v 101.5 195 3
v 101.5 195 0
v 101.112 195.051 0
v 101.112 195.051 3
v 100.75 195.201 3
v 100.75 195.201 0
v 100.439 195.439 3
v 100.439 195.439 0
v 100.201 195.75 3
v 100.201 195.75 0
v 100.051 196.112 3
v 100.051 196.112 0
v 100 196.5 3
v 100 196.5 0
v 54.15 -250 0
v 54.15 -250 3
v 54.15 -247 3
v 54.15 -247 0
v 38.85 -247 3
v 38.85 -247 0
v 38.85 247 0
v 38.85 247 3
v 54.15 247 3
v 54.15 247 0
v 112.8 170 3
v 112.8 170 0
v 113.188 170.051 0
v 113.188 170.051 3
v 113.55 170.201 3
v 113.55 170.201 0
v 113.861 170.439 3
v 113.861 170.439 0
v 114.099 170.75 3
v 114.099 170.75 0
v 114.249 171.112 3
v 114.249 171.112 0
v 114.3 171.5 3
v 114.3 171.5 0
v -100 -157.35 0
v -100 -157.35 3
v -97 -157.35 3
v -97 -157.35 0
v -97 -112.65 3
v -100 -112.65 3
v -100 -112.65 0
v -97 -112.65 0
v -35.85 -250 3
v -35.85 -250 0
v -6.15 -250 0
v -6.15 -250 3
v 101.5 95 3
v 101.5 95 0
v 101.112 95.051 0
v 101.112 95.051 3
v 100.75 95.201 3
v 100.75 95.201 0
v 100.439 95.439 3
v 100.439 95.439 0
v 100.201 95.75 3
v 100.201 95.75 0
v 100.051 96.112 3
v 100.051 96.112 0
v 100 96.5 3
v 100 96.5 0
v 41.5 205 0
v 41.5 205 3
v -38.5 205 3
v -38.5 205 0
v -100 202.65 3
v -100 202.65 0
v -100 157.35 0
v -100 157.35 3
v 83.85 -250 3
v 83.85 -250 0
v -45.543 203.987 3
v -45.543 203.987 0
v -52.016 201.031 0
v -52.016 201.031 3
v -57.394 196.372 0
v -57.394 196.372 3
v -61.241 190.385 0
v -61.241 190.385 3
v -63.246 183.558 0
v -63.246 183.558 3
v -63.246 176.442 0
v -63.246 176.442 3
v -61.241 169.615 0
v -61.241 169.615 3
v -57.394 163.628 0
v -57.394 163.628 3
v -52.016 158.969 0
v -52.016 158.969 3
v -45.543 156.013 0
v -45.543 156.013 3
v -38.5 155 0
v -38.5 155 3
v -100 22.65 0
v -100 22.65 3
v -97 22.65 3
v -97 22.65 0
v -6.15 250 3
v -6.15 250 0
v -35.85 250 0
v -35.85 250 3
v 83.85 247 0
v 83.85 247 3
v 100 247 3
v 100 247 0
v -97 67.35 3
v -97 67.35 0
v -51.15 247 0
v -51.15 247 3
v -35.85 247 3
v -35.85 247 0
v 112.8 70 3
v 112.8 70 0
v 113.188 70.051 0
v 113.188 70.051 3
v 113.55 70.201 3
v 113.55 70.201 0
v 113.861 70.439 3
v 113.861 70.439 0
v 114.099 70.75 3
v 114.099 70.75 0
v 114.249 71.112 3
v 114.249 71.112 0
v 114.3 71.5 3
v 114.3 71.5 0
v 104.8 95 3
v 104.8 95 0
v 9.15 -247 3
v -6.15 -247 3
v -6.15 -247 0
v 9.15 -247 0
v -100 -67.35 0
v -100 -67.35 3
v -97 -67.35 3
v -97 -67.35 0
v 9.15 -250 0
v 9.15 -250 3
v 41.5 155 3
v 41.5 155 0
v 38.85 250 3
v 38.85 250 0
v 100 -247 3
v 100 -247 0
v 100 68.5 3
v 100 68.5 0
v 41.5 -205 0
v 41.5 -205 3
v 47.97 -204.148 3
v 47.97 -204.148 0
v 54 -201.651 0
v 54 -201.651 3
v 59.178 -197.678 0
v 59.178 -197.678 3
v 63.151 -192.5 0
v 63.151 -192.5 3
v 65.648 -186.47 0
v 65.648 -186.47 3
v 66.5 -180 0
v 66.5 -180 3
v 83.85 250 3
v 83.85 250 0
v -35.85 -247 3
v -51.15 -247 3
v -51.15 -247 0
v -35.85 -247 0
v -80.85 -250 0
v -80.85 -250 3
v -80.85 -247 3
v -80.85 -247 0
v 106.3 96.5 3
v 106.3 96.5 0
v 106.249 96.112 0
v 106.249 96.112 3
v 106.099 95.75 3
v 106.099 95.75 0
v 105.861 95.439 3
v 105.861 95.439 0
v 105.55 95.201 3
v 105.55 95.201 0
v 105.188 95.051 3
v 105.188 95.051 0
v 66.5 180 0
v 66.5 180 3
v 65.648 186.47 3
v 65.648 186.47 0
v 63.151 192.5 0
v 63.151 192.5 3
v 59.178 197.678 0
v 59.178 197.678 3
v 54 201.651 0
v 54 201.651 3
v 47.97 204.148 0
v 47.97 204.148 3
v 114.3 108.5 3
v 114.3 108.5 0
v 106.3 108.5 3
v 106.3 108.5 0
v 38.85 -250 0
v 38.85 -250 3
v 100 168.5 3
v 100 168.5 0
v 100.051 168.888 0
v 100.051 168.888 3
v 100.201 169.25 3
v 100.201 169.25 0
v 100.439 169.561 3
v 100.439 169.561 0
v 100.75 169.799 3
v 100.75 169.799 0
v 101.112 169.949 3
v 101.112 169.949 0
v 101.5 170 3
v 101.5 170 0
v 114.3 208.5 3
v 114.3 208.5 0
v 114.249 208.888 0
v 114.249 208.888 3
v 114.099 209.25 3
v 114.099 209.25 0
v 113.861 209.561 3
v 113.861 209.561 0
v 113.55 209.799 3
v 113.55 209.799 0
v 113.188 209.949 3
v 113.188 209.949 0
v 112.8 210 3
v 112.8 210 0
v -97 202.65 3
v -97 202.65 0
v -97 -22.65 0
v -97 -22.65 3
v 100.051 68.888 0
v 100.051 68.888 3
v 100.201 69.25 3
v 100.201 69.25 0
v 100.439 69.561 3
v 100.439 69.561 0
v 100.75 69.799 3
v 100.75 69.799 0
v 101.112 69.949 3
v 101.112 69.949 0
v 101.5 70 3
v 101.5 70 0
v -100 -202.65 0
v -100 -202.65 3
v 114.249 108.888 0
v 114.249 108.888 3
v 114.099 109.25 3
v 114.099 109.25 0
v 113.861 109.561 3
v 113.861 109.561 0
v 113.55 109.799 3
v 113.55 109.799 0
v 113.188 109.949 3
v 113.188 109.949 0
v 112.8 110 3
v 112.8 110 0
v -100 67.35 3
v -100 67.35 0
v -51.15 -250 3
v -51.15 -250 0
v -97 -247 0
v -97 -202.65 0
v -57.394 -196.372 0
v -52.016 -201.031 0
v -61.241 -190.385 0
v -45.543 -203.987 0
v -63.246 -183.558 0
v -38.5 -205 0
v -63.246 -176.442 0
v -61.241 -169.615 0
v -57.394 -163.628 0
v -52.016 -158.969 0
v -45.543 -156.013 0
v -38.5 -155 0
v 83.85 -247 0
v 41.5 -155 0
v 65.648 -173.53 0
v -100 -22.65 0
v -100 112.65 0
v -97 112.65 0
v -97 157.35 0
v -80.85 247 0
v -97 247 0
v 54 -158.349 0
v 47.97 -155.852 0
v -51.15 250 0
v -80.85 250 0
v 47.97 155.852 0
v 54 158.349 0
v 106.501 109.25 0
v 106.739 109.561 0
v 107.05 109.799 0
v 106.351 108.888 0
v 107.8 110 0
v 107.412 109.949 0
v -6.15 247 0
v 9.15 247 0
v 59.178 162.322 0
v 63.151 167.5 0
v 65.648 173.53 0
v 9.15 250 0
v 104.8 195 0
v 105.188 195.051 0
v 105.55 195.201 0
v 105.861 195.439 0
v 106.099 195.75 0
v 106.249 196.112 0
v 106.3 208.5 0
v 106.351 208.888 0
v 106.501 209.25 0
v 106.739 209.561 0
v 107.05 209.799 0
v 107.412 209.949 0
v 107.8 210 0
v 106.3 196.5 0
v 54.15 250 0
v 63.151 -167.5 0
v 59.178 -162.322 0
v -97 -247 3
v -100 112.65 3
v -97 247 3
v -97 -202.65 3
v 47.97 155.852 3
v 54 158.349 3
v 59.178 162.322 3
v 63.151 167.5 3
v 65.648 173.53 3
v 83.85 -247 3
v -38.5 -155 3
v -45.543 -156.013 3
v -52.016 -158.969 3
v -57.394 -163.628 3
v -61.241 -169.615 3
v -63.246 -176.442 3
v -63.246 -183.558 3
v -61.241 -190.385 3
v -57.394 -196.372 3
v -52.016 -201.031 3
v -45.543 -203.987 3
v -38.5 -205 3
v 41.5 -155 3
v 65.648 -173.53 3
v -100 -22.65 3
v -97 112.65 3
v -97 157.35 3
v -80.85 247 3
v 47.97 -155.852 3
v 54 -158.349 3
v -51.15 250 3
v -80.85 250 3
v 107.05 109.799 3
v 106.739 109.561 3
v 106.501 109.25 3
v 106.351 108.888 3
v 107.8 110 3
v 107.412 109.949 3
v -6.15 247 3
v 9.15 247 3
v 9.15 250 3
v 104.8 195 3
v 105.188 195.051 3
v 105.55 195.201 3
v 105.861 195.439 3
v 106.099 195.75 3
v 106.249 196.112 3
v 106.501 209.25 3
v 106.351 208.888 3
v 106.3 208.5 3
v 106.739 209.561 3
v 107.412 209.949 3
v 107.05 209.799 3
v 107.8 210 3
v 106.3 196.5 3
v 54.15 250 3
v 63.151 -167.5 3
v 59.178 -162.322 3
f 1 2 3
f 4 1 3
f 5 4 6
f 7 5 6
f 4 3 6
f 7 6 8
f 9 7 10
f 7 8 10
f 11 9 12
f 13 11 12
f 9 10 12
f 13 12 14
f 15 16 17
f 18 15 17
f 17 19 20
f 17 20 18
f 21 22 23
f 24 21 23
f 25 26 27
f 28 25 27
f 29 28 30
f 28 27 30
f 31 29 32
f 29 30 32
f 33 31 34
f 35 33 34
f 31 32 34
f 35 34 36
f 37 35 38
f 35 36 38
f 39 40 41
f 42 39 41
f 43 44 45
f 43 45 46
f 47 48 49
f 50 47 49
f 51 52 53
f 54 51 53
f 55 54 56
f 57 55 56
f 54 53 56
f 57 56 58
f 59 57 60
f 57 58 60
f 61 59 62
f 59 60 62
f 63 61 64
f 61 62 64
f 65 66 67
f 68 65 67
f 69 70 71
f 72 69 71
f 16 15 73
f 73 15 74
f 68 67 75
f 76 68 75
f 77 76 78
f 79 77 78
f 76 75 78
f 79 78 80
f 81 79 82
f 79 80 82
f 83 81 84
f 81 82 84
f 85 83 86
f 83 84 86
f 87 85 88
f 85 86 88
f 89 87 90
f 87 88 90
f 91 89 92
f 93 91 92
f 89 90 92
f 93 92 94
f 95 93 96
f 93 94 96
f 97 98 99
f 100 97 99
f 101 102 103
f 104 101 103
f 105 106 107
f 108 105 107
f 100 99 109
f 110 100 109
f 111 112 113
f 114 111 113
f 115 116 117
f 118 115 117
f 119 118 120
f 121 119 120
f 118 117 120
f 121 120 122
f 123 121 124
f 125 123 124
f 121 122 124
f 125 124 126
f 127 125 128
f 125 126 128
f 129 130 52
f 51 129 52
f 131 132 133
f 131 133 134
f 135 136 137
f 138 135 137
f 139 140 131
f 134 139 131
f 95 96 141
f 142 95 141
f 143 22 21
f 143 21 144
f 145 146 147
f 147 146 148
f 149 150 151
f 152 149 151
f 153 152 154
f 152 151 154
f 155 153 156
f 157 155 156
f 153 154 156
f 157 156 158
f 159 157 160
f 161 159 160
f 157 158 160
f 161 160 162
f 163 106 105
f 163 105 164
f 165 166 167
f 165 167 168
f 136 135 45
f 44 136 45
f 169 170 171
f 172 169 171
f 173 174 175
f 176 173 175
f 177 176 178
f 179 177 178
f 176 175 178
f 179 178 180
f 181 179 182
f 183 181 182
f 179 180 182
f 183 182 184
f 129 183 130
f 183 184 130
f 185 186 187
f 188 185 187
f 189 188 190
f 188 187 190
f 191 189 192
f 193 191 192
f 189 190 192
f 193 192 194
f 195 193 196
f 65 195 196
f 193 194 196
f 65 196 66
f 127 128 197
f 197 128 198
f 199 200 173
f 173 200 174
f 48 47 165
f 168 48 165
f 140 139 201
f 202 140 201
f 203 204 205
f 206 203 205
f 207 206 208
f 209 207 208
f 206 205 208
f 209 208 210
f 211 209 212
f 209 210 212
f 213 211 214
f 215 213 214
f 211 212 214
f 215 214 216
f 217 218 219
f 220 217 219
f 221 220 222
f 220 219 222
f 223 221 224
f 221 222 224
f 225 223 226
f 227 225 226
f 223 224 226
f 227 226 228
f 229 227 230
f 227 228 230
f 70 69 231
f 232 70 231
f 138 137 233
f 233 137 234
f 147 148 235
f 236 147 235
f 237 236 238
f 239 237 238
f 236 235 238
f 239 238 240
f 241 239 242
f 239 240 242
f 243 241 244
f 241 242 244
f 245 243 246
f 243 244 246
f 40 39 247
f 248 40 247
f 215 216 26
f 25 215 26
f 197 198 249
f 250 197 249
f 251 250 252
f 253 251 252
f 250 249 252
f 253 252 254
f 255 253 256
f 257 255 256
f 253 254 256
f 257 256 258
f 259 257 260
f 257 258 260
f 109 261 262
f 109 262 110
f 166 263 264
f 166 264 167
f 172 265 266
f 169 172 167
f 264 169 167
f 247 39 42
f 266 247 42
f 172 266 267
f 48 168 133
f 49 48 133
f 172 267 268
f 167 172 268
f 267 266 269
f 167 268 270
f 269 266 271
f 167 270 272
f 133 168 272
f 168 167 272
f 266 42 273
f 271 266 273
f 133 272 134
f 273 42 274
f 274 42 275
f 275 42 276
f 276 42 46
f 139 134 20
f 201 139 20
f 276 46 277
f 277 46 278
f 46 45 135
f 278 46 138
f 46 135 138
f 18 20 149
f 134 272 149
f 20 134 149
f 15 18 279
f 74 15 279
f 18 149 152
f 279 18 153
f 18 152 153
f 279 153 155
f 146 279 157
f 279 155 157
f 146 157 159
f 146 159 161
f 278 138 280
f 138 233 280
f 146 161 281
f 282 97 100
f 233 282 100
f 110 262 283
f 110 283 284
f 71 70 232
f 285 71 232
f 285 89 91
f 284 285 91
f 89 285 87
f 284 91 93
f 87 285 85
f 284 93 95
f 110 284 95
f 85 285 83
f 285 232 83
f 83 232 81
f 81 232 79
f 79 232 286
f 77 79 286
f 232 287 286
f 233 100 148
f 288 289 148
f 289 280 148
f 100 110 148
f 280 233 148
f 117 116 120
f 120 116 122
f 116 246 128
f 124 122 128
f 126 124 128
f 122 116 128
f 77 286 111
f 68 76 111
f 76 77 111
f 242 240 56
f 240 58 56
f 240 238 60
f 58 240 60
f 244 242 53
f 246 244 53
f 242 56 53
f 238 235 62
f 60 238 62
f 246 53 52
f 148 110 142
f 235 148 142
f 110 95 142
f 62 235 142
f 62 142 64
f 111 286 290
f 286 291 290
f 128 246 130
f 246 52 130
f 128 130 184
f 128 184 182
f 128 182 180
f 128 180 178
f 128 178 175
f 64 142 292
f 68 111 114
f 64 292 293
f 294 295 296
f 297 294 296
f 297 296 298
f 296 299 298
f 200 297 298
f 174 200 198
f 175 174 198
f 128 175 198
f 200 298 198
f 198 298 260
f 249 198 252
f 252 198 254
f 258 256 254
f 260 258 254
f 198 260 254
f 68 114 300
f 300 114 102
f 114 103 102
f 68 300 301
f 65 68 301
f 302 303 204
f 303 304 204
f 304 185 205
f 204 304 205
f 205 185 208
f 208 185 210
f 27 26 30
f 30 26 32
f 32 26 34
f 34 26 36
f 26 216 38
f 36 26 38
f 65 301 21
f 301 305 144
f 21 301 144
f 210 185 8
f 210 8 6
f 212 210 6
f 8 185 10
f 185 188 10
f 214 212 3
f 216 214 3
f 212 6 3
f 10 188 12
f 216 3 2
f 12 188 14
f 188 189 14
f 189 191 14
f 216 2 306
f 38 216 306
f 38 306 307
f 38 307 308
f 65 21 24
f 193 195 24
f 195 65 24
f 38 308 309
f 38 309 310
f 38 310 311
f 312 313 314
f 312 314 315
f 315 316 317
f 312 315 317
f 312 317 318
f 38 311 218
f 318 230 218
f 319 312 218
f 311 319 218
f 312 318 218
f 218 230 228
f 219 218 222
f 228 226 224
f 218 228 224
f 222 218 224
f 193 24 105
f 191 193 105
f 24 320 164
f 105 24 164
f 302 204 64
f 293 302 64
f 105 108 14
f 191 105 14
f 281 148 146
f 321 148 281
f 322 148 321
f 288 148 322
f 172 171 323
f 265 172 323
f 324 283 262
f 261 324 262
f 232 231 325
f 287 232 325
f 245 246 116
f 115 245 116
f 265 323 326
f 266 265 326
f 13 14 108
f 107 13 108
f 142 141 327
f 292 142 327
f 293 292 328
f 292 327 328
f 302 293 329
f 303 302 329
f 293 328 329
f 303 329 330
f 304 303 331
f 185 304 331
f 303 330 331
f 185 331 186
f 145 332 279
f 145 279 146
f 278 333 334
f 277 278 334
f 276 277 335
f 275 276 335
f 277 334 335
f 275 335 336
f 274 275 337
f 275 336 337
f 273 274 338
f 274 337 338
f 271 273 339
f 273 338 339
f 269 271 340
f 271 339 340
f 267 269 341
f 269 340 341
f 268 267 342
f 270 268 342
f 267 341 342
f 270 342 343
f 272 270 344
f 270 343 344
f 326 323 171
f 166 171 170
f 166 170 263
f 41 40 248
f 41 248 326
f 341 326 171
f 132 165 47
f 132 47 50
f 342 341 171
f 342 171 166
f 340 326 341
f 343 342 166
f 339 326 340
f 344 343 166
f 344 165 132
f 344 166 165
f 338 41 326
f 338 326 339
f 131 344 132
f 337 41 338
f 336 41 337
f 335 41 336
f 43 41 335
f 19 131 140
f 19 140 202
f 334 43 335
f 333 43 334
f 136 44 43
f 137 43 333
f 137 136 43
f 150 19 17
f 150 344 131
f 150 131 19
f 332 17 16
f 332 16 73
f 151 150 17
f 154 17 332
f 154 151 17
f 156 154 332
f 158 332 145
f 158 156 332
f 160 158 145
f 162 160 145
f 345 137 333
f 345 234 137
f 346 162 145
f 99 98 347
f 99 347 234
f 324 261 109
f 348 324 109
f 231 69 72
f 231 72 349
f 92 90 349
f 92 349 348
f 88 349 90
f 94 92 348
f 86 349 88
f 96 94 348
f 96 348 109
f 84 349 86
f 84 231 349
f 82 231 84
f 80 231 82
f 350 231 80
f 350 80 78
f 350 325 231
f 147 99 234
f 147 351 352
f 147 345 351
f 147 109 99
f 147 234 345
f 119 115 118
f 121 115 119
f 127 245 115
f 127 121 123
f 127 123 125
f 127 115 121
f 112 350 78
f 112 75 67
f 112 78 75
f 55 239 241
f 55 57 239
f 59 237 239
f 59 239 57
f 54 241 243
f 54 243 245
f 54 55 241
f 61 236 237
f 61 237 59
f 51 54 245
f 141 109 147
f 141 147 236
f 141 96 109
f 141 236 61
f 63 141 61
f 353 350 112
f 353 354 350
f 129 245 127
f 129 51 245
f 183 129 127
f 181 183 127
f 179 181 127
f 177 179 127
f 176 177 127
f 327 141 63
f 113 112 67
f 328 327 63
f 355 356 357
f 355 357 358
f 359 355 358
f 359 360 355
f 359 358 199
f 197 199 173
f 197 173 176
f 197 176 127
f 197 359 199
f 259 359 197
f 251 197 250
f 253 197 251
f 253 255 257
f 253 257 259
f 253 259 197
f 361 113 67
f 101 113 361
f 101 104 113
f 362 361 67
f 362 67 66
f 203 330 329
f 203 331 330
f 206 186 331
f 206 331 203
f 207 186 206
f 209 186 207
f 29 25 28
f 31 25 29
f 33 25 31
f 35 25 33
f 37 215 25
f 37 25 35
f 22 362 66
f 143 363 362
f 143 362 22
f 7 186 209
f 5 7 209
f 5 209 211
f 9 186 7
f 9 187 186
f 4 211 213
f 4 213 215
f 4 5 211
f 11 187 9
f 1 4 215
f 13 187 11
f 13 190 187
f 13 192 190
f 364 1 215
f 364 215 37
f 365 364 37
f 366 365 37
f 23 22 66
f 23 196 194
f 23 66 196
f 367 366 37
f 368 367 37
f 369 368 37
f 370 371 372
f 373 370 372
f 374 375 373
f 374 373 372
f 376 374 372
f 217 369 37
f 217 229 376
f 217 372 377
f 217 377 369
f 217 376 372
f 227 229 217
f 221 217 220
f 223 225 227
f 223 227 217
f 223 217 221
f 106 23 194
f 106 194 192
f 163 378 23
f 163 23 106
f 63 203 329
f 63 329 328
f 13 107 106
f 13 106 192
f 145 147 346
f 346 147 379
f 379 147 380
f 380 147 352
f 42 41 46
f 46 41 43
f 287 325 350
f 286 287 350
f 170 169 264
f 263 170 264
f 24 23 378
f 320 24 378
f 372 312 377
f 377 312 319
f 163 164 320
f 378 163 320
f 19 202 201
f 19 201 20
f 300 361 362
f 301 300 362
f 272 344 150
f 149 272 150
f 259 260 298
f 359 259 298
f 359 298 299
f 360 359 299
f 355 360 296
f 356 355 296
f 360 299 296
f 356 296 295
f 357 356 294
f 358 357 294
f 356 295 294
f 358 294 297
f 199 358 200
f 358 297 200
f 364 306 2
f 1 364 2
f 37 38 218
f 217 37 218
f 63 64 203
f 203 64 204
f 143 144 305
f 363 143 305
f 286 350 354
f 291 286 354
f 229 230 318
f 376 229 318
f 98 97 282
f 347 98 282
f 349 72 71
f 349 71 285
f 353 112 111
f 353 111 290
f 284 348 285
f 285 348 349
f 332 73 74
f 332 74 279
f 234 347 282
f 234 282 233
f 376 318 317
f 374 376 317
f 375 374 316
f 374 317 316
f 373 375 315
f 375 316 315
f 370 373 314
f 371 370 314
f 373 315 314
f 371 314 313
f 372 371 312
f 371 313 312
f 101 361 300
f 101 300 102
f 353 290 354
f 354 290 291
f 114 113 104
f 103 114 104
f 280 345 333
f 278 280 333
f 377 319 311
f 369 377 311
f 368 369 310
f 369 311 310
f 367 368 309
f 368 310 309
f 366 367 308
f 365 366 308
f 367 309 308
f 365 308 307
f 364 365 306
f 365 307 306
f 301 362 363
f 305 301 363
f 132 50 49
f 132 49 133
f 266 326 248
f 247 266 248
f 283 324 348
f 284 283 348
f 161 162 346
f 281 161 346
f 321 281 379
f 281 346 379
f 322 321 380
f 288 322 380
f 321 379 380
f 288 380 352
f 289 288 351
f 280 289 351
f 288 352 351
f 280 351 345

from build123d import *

# Parameters (mm, degrees)
SALIENTE_EXTRUIR1_DEPTH = 3
CORTAR_EXTRUIR1_REACH   = 5
CROQUIS2_W              = 15.3
CROQUIS2_H              = 3
CROQUIS2_W_2            = 16.15
CROQUIS2_W_3            = 3
CROQUIS2_H_2            = 44.7


with BuildPart() as part:
    # Croquis1 → Saliente-Extruir1 (new body)
    with BuildSketch(Plane.XY):
        with BuildLine():
            Line((104.8, 195), (101.5, 195))
            ThreePointArc((101.5, 195), (100.439339828, 195.439339828), (100, 196.5))
            Line((100, 196.5), (100, 250))
            Line((100, 250), (-100, 250))
            Line((-100, 250), (-100, -250))
            Line((-100, -250), (100, -250))
            Line((100, -250), (100, -35.619856886))
            Line((100, -35.619856886), (100, -30))
            Line((100, -30), (100, -5))
            Line((100, -5), (100, 68.5))
            ThreePointArc((100, 68.5), (100.439339828, 69.560660172), (101.5, 70))
            Line((101.5, 70), (112.8, 70))
            ThreePointArc((112.8, 70), (113.860660172, 70.439339828), (114.3, 71.5))
            Line((114.3, 71.5), (114.3, 108.5))
            ThreePointArc((114.3, 108.5), (113.860660172, 109.560660172), (112.8, 110))
            Line((112.8, 110), (107.8, 110))
            ThreePointArc((107.8, 110), (106.739339828, 109.560660172), (106.3, 108.5))
            Line((106.3, 108.5), (106.3, 96.5))
            ThreePointArc((106.3, 96.5), (105.860660172, 95.439339828), (104.8, 95))
            Line((104.8, 95), (101.5, 95))
            ThreePointArc((101.5, 95), (100.439339828, 95.439339828), (100, 96.5))
            Line((100, 96.5), (100, 168.5))
            ThreePointArc((100, 168.5), (100.439339828, 169.560660172), (101.5, 170))
            Line((101.5, 170), (112.8, 170))
            ThreePointArc((112.8, 170), (113.860660172, 170.439339828), (114.3, 171.5))
            Line((114.3, 171.5), (114.3, 208.5))
            ThreePointArc((114.3, 208.5), (113.860660172, 209.560660172), (112.8, 210))
            Line((112.8, 210), (107.8, 210))
            ThreePointArc((107.8, 210), (106.739339828, 209.560660172), (106.3, 208.5))
            Line((106.3, 208.5), (106.3, 196.5))
            ThreePointArc((106.3, 196.5), (105.860660172, 195.439339828), (104.8, 195))
        make_face()
    extrude(amount=SALIENTE_EXTRUIR1_DEPTH)

    # Croquis2 → Cortar-Extruir1 (cut, up to next)
    with BuildSketch(Plane.XY.offset(3), mode=Mode.PRIVATE) as cortar_extruir1_sk1:
        Polygon((-100, -250), (-80.85, -250), (-80.85, -247), (-97, -247), (-97, -202.65), (-100, -202.65), align=None)
    cortar_extruir1_tool1 = extrude(cortar_extruir1_sk1.sketch, amount=-CORTAR_EXTRUIR1_REACH, mode=Mode.PRIVATE) & part.part
    add(cortar_extruir1_tool1.solids().sort_by_distance((-99.489241, -226.325, 3))[0], mode=Mode.SUBTRACT)
    # Croquis2 → Cortar-Extruir1 (cut, up to next)
    with BuildSketch(Plane.XY.offset(3), mode=Mode.PRIVATE) as cortar_extruir1_sk2:
        with Locations((-43.5, -248.5)):
            Rectangle(CROQUIS2_W, CROQUIS2_H)
    cortar_extruir1_tool2 = extrude(cortar_extruir1_sk2.sketch, amount=-CORTAR_EXTRUIR1_REACH, mode=Mode.PRIVATE) & part.part
    add(cortar_extruir1_tool2.solids().sort_by_distance((-43.5, -248.5, 3))[0], mode=Mode.SUBTRACT)
    # Croquis2 → Cortar-Extruir1 (cut, up to next)
    with BuildSketch(Plane.XY.offset(3), mode=Mode.PRIVATE) as cortar_extruir1_sk3:
        with Locations((1.5, -248.5)):
            Rectangle(CROQUIS2_W, CROQUIS2_H)
    cortar_extruir1_tool3 = extrude(cortar_extruir1_sk3.sketch, amount=-CORTAR_EXTRUIR1_REACH, mode=Mode.PRIVATE) & part.part
    add(cortar_extruir1_tool3.solids().sort_by_distance((1.5, -248.5, 3))[0], mode=Mode.SUBTRACT)
    # Croquis2 → Cortar-Extruir1 (cut, up to next)
    with BuildSketch(Plane.XY.offset(3), mode=Mode.PRIVATE) as cortar_extruir1_sk4:
        with Locations((46.5, -248.5)):
            Rectangle(CROQUIS2_W, CROQUIS2_H)
    cortar_extruir1_tool4 = extrude(cortar_extruir1_sk4.sketch, amount=-CORTAR_EXTRUIR1_REACH, mode=Mode.PRIVATE) & part.part
    add(cortar_extruir1_tool4.solids().sort_by_distance((46.5, -248.5, 3))[0], mode=Mode.SUBTRACT)
    # Croquis2 → Cortar-Extruir1 (cut, up to next)
    with BuildSketch(Plane.XY.offset(3), mode=Mode.PRIVATE) as cortar_extruir1_sk5:
        with Locations((91.925, -248.5)):
            Rectangle(CROQUIS2_W_2, CROQUIS2_H)
    cortar_extruir1_tool5 = extrude(cortar_extruir1_sk5.sketch, amount=-CORTAR_EXTRUIR1_REACH, mode=Mode.PRIVATE) & part.part
    add(cortar_extruir1_tool5.solids().sort_by_distance((91.925, -248.5, 3))[0], mode=Mode.SUBTRACT)
    # Croquis2 → Cortar-Extruir1 (cut, up to next)
    with BuildSketch(Plane.XY.offset(3), mode=Mode.PRIVATE) as cortar_extruir1_sk6:
        with Locations((-98.5, -135)):
            Rectangle(CROQUIS2_W_3, CROQUIS2_H_2)
    cortar_extruir1_tool6 = extrude(cortar_extruir1_sk6.sketch, amount=-CORTAR_EXTRUIR1_REACH, mode=Mode.PRIVATE) & part.part
    add(cortar_extruir1_tool6.solids().sort_by_distance((-98.5, -135, 3))[0], mode=Mode.SUBTRACT)
    # Croquis2 → Cortar-Extruir1 (cut, up to next)
    with BuildSketch(Plane.XY.offset(3), mode=Mode.PRIVATE) as cortar_extruir1_sk7:
        with Locations((-98.5, -45)):
            Rectangle(CROQUIS2_W_3, CROQUIS2_H_2)
    cortar_extruir1_tool7 = extrude(cortar_extruir1_sk7.sketch, amount=-CORTAR_EXTRUIR1_REACH, mode=Mode.PRIVATE) & part.part
    add(cortar_extruir1_tool7.solids().sort_by_distance((-98.5, -45, 3))[0], mode=Mode.SUBTRACT)
    # Croquis2 → Cortar-Extruir1 (cut, up to next)
    with BuildSketch(Plane.XY.offset(3), mode=Mode.PRIVATE) as cortar_extruir1_sk8:
        with Locations((-98.5, 45)):
            Rectangle(CROQUIS2_W_3, CROQUIS2_H_2)
    cortar_extruir1_tool8 = extrude(cortar_extruir1_sk8.sketch, amount=-CORTAR_EXTRUIR1_REACH, mode=Mode.PRIVATE) & part.part
    add(cortar_extruir1_tool8.solids().sort_by_distance((-98.5, 45, 3))[0], mode=Mode.SUBTRACT)
    # Croquis2 → Cortar-Extruir1 (cut, up to next)
    with BuildSketch(Plane.XY.offset(3), mode=Mode.PRIVATE) as cortar_extruir1_sk9:
        with Locations((-98.5, 135)):
            Rectangle(CROQUIS2_W_3, CROQUIS2_H_2)
    cortar_extruir1_tool9 = extrude(cortar_extruir1_sk9.sketch, amount=-CORTAR_EXTRUIR1_REACH, mode=Mode.PRIVATE) & part.part
    add(cortar_extruir1_tool9.solids().sort_by_distance((-98.5, 135, 3))[0], mode=Mode.SUBTRACT)
    # Croquis2 → Cortar-Extruir1 (cut, up to next)
    with BuildSketch(Plane.XY.offset(3), mode=Mode.PRIVATE) as cortar_extruir1_sk10:
        Polygon((-80.85, 247), (-80.85, 250), (-100, 250), (-100, 202.65), (-97, 202.65), (-97, 247), align=None)
    cortar_extruir1_tool10 = extrude(cortar_extruir1_sk10.sketch, amount=-CORTAR_EXTRUIR1_REACH, mode=Mode.PRIVATE) & part.part
    add(cortar_extruir1_tool10.solids().sort_by_distance((-81.360759, 248.5, 3))[0], mode=Mode.SUBTRACT)
    # Croquis2 → Cortar-Extruir1 (cut, up to next)
    with BuildSketch(Plane.XY.offset(3), mode=Mode.PRIVATE) as cortar_extruir1_sk11:
        with Locations((-43.5, 248.5)):
            Rectangle(CROQUIS2_W, CROQUIS2_H)
    cortar_extruir1_tool11 = extrude(cortar_extruir1_sk11.sketch, amount=-CORTAR_EXTRUIR1_REACH, mode=Mode.PRIVATE) & part.part
    add(cortar_extruir1_tool11.solids().sort_by_distance((-43.5, 248.5, 3))[0], mode=Mode.SUBTRACT)
    # Croquis2 → Cortar-Extruir1 (cut, up to next)
    with BuildSketch(Plane.XY.offset(3), mode=Mode.PRIVATE) as cortar_extruir1_sk12:
        with BuildLine():
            ThreePointArc((41.5, 155), (59.17766953, 162.32233047), (66.5, 180))
            ThreePointArc((66.5, 180), (59.17766953, 197.67766953), (41.5, 205))
            Line((41.5, 205), (-38.5, 205))
            ThreePointArc((-38.5, 205), (-63.5, 180), (-38.5, 155))
            Line((-38.5, 155), (41.5, 155))
        make_face()
    cortar_extruir1_tool12 = extrude(cortar_extruir1_sk12.sketch, amount=-CORTAR_EXTRUIR1_REACH, mode=Mode.PRIVATE) & part.part
    add(cortar_extruir1_tool12.solids().sort_by_distance((1.5, 180, 3))[0], mode=Mode.SUBTRACT)
    # Croquis2 → Cortar-Extruir1 (cut, up to next)
    with BuildSketch(Plane.XY.offset(3), mode=Mode.PRIVATE) as cortar_extruir1_sk13:
        with Locations((46.5, 248.5)):
            Rectangle(CROQUIS2_W, CROQUIS2_H)
    cortar_extruir1_tool13 = extrude(cortar_extruir1_sk13.sketch, amount=-CORTAR_EXTRUIR1_REACH, mode=Mode.PRIVATE) & part.part
    add(cortar_extruir1_tool13.solids().sort_by_distance((46.5, 248.5, 3))[0], mode=Mode.SUBTRACT)
    # Croquis2 → Cortar-Extruir1 (cut, up to next)
    with BuildSketch(Plane.XY.offset(3), mode=Mode.PRIVATE) as cortar_extruir1_sk14:
        with Locations((1.5, 248.5)):
            Rectangle(CROQUIS2_W, CROQUIS2_H)
    cortar_extruir1_tool14 = extrude(cortar_extruir1_sk14.sketch, amount=-CORTAR_EXTRUIR1_REACH, mode=Mode.PRIVATE) & part.part
    add(cortar_extruir1_tool14.solids().sort_by_distance((1.5, 248.5, 3))[0], mode=Mode.SUBTRACT)
    # Croquis2 → Cortar-Extruir1 (cut, up to next)
    with BuildSketch(Plane.XY.offset(3), mode=Mode.PRIVATE) as cortar_extruir1_sk15:
        with Locations((91.925, 248.5)):
            Rectangle(CROQUIS2_W_2, CROQUIS2_H)
    cortar_extruir1_tool15 = extrude(cortar_extruir1_sk15.sketch, amount=-CORTAR_EXTRUIR1_REACH, mode=Mode.PRIVATE) & part.part
    add(cortar_extruir1_tool15.solids().sort_by_distance((91.925, 248.5, 3))[0], mode=Mode.SUBTRACT)
    # Croquis2 → Cortar-Extruir1 (cut, up to next)
    with BuildSketch(Plane.XY.offset(3), mode=Mode.PRIVATE) as cortar_extruir1_sk16:
        with BuildLine():
            ThreePointArc((41.5, -205), (59.17766953, -197.67766953), (66.5, -180))
            ThreePointArc((66.5, -180), (59.17766953, -162.32233047), (41.5, -155))
            Line((41.5, -155), (-38.5, -155))
            ThreePointArc((-38.5, -155), (-63.5, -180), (-38.5, -205))
            Line((-38.5, -205), (41.5, -205))
        make_face()
    cortar_extruir1_tool16 = extrude(cortar_extruir1_sk16.sketch, amount=-CORTAR_EXTRUIR1_REACH, mode=Mode.PRIVATE) & part.part
    add(cortar_extruir1_tool16.solids().sort_by_distance((1.5, -180, 3))[0], mode=Mode.SUBTRACT)


solid = part.part
